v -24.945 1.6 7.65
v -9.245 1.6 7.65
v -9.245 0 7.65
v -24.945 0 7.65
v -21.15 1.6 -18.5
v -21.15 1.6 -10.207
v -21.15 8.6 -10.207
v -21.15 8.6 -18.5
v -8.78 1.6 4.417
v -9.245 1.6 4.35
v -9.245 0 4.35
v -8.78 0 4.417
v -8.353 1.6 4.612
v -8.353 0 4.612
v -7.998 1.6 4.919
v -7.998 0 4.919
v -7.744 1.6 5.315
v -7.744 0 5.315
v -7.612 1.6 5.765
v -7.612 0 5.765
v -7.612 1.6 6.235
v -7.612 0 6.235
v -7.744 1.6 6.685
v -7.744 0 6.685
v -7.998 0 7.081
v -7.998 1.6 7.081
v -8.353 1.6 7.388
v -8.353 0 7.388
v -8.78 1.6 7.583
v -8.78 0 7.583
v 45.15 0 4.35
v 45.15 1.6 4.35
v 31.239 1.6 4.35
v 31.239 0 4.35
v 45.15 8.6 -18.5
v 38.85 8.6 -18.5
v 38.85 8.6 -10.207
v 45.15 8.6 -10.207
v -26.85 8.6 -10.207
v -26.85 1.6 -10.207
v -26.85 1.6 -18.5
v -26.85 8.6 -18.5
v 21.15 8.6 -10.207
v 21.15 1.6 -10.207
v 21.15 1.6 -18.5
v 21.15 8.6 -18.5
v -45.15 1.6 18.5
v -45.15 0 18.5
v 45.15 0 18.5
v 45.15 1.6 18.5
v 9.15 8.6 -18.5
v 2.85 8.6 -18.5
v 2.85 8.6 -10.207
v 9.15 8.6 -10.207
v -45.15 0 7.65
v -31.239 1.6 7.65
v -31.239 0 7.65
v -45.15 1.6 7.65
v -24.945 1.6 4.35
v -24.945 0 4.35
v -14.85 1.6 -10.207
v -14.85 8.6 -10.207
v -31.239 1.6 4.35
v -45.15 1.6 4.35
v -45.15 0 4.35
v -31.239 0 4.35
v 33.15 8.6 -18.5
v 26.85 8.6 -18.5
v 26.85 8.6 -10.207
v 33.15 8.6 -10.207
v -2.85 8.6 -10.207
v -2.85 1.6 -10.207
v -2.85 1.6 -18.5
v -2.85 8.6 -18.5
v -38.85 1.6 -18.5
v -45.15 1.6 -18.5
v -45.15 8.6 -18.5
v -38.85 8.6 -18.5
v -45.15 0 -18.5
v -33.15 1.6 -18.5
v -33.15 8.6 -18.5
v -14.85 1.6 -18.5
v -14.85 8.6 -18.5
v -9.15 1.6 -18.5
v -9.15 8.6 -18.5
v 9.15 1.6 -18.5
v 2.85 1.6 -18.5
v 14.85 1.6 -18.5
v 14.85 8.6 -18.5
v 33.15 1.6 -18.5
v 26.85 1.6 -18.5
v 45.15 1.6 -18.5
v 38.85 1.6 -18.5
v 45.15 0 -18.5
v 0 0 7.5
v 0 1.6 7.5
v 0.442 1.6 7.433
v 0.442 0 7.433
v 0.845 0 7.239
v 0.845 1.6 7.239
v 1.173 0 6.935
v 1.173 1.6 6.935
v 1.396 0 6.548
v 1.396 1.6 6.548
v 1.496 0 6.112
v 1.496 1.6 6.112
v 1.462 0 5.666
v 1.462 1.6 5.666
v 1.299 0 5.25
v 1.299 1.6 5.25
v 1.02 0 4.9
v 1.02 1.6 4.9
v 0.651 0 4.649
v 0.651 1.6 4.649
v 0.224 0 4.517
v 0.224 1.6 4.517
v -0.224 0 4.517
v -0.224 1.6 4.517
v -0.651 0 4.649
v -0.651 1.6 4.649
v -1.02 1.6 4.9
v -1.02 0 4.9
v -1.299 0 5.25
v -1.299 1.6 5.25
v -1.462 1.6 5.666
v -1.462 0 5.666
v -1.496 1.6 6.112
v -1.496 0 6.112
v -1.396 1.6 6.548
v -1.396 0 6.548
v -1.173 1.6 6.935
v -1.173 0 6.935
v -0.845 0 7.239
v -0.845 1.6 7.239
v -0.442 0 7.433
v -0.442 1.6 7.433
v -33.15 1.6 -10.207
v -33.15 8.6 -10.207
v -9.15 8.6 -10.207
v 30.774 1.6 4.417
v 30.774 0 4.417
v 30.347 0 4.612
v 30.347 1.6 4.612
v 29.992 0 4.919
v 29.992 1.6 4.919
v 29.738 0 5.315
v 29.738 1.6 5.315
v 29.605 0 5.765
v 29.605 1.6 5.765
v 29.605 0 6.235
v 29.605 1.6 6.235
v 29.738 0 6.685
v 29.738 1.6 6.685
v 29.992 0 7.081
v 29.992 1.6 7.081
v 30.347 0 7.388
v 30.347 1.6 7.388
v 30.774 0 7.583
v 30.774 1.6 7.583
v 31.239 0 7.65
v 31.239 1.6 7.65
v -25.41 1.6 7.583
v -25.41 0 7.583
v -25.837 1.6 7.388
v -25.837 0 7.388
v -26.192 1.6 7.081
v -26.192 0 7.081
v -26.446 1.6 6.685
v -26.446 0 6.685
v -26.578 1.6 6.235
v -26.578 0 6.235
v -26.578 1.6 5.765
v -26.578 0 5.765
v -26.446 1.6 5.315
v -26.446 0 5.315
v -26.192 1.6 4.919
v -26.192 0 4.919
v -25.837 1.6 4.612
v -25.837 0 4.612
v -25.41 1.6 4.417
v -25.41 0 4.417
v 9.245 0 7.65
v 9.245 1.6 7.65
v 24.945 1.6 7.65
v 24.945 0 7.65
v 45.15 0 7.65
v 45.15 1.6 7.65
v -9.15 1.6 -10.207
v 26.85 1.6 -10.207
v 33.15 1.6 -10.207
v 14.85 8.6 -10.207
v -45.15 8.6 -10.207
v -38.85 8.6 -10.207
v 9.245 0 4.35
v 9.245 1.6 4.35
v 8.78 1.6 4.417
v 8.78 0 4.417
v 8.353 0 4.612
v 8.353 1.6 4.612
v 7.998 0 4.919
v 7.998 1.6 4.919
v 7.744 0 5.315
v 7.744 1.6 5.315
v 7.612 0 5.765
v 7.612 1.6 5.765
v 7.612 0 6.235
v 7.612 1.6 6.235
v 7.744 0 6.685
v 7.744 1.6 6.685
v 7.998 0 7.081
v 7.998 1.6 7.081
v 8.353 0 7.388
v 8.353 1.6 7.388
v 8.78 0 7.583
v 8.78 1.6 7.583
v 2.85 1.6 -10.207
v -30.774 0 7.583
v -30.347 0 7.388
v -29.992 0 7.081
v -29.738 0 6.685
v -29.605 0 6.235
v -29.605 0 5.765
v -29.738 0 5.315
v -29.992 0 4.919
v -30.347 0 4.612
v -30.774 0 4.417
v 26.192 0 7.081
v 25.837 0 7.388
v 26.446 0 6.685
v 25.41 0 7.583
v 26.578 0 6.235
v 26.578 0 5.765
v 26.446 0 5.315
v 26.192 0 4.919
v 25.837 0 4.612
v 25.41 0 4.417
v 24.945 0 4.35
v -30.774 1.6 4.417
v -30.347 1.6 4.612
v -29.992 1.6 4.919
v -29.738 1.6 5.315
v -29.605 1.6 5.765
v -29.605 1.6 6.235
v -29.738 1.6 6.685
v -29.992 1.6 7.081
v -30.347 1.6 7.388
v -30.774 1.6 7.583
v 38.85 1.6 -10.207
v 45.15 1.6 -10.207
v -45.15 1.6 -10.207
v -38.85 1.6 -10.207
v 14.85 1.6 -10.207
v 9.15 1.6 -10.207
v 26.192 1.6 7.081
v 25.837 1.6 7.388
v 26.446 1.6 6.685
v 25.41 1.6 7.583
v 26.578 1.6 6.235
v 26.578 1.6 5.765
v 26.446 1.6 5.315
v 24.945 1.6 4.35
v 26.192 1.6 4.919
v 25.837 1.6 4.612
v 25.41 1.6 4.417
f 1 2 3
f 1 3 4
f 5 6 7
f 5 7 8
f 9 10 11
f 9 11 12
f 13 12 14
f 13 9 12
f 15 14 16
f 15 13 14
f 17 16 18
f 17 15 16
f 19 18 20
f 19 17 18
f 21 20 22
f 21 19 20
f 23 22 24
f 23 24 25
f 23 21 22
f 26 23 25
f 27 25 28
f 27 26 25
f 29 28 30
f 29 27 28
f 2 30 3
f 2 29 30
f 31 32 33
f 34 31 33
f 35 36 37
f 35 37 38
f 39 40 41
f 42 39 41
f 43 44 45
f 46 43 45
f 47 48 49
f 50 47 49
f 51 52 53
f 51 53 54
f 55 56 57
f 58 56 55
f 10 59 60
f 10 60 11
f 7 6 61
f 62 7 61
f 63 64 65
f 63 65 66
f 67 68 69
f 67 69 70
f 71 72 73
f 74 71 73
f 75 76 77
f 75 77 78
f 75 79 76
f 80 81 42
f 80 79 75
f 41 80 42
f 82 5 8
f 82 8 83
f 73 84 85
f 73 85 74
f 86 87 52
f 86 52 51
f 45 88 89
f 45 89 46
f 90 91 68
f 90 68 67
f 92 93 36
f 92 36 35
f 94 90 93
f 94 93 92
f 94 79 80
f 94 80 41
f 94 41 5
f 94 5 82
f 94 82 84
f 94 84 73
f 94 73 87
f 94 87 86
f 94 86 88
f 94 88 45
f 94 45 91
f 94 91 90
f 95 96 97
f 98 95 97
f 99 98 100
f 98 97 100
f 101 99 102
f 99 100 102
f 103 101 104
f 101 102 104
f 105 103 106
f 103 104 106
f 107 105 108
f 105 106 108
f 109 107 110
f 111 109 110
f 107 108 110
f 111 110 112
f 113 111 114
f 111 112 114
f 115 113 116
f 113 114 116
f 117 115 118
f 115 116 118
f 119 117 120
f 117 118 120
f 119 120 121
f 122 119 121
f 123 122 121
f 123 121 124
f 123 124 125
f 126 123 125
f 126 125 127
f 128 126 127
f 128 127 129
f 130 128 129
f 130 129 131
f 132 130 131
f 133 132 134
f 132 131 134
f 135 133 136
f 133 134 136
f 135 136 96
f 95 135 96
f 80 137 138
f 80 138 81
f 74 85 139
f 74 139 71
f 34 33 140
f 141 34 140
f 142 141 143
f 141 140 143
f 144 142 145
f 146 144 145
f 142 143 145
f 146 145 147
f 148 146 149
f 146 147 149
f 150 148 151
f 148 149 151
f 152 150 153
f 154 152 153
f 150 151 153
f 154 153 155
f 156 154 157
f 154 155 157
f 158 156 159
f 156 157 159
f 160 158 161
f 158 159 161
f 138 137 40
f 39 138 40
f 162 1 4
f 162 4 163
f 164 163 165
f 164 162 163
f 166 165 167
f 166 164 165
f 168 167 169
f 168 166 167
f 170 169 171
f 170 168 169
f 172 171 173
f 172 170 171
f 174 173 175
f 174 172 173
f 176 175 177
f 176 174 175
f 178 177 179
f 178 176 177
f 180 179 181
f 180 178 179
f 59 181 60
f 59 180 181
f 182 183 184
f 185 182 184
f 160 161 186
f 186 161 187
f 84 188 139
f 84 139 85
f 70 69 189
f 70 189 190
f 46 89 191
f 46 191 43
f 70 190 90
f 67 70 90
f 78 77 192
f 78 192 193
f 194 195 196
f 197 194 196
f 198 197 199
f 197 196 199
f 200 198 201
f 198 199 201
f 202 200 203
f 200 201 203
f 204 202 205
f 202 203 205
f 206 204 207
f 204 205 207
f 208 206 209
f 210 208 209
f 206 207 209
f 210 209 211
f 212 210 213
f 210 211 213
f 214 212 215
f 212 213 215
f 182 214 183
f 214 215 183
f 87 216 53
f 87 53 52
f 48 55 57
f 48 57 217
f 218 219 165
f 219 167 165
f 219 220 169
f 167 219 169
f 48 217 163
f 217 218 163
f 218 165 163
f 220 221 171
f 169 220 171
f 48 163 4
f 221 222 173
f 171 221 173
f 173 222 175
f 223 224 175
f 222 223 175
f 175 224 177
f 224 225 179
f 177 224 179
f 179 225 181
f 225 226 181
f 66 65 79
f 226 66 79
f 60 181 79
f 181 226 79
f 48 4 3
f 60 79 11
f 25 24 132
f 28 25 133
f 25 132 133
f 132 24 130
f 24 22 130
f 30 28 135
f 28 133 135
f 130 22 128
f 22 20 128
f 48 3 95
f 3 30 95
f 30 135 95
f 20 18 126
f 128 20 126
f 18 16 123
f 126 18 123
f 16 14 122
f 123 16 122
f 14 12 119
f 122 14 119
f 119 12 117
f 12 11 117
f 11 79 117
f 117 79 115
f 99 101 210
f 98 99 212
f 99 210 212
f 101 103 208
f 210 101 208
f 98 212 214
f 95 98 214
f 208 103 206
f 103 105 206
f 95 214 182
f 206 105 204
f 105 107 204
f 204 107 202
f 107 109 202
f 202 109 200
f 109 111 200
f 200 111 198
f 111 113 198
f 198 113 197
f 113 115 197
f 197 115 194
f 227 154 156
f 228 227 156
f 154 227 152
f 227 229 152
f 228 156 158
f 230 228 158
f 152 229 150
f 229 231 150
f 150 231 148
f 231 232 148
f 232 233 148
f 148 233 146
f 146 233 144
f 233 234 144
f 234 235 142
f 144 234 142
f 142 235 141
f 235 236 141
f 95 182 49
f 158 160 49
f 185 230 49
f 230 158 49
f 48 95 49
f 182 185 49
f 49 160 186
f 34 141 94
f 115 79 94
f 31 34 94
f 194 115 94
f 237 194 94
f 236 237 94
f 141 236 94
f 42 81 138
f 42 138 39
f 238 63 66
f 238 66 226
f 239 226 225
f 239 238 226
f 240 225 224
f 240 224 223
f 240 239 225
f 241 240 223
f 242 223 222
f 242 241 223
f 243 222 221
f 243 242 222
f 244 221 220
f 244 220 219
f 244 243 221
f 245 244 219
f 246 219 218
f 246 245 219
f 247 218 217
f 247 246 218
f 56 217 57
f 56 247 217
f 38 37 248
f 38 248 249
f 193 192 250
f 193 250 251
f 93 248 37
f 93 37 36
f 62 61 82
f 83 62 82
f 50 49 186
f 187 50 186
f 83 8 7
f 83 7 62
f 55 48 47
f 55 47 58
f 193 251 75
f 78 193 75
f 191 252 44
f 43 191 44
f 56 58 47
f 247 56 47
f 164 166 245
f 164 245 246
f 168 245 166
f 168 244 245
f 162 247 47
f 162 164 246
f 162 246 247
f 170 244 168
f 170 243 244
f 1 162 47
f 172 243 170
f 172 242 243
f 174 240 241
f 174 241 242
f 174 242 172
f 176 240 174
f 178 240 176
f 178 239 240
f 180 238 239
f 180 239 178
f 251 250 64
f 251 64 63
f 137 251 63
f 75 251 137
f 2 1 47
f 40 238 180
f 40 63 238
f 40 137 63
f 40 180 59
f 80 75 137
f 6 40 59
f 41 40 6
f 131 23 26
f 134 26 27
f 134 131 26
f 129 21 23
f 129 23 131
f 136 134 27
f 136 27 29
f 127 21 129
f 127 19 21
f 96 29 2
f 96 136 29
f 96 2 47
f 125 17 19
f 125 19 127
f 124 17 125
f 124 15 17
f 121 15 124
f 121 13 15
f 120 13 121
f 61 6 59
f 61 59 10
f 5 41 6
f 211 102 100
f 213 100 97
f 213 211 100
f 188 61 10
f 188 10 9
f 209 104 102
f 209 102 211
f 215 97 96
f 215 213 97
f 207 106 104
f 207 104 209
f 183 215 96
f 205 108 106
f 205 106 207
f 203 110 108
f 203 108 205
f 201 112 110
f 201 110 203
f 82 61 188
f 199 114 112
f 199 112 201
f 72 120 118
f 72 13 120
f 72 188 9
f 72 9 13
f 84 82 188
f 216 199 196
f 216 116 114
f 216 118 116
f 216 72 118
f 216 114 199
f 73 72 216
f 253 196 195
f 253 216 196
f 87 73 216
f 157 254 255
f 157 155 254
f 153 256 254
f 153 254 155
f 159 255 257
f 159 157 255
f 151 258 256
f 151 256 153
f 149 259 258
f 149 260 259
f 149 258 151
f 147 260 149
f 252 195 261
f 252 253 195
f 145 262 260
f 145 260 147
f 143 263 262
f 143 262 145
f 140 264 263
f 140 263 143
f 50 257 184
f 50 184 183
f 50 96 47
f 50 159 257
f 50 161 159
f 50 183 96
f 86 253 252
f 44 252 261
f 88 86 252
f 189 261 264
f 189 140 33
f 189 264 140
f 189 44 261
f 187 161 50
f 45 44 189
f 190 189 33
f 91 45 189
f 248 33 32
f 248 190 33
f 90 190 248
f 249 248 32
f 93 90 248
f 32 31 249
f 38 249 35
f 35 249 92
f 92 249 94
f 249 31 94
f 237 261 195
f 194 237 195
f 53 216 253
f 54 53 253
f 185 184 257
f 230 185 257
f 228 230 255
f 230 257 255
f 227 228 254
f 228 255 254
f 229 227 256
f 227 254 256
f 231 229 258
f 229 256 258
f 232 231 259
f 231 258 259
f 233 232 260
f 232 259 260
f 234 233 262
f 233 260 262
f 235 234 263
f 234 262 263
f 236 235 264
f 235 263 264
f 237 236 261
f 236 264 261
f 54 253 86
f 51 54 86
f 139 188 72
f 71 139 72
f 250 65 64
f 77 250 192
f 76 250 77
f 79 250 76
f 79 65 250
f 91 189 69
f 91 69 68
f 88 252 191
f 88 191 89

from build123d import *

# Parameters (mm, degrees)
SKETCH_1_W          = 90.3
SKETCH_1_H          = 37
EXTRUDE_1_DEPTH     = 1.6
SKETCH_3_R          = 1.5
CUT_EXTRUDE_1_DEPTH = 1.6
SKETCH_4_W          = 6.3
SKETCH_4_H          = 8.293497289
EXTRUDE_2_DEPTH     = 7


with BuildPart() as part:
    # 草图1 → 凸台-拉伸1 (new body)
    with BuildSketch(Plane(origin=(0, 0, 0), x_dir=(1, 0, 0), z_dir=(0, 1, 0))):
        Rectangle(SKETCH_1_W, SKETCH_1_H)
    extrude(amount=EXTRUDE_1_DEPTH)

    # 草图3 → 切除-拉伸1 (cut)
    with BuildSketch(Plane(origin=(0, 1.6, 0), x_dir=(1, 0, 0), z_dir=(0, 1, 0))):
        with Locations(Location((0, -6, 0), (0, 0, 270))):
            Circle(SKETCH_3_R)
        with BuildLine():
            Line((-31.238672513, -7.65), (-53.101992088, -7.65))
            ThreePointArc((-53.101992088, -7.65), (-54.751992088, -6), (-53.101992088, -4.35))
            Line((-53.101992088, -4.35), (-31.238672513, -4.35))
            ThreePointArc((-31.238672513, -4.35), (-29.588672513, -6), (-31.238672513, -7.65))
        make_face()
        with BuildLine():
            Line((-24.944724021, -4.35), (-9.244724021, -4.35))
            ThreePointArc((-9.244724021, -4.35), (-7.594724021, -6), (-9.244724021, -7.65))
            Line((-9.244724021, -7.65), (-24.944724021, -7.65))
            ThreePointArc((-24.944724021, -7.65), (-26.594724021, -6), (-24.944724021, -4.35))
        make_face()
        with BuildLine():
            Line((31.238672513, -7.65), (53.101992088, -7.65))
            ThreePointArc((53.101992088, -7.65), (54.751992088, -6), (53.101992088, -4.35))
            Line((53.101992088, -4.35), (31.238672513, -4.35))
            ThreePointArc((31.238672513, -4.35), (29.588672513, -6), (31.238672513, -7.65))
        make_face()
        with BuildLine():
            Line((24.944724021, -4.35), (9.244724021, -4.35))
            ThreePointArc((9.244724021, -4.35), (7.594724021, -6), (9.244724021, -7.65))
            Line((9.244724021, -7.65), (24.944724021, -7.65))
            ThreePointArc((24.944724021, -7.65), (26.594724021, -6), (24.944724021, -4.35))
        make_face()
    extrude(amount=-CUT_EXTRUDE_1_DEPTH, mode=Mode.SUBTRACT)

    # 草图4 → 凸台-拉伸2 (add)
    with BuildSketch(Plane(origin=(0, 1.6, 0), x_dir=(1, 0, 0), z_dir=(0, 1, 0))):
        with Locations((-30, 14.353251355)):
            Rectangle(SKETCH_4_W, SKETCH_4_H)
        with Locations((-42, 14.353251355)):
            Rectangle(SKETCH_4_W, SKETCH_4_H)
        with Locations((-18, 14.353251355)):
            Rectangle(SKETCH_4_W, SKETCH_4_H)
        with Locations((-6, 14.353251355)):
            Rectangle(SKETCH_4_W, SKETCH_4_H)
        with Locations((6, 14.353251355)):
            Rectangle(SKETCH_4_W, SKETCH_4_H)
        with Locations((18, 14.353251355)):
            Rectangle(SKETCH_4_W, SKETCH_4_H)
        with Locations((30, 14.353251355)):
            Rectangle(SKETCH_4_W, SKETCH_4_H)
        with Locations((42, 14.353251355)):
            Rectangle(SKETCH_4_W, SKETCH_4_H)
    extrude(amount=EXTRUDE_2_DEPTH)


solid = part.part
